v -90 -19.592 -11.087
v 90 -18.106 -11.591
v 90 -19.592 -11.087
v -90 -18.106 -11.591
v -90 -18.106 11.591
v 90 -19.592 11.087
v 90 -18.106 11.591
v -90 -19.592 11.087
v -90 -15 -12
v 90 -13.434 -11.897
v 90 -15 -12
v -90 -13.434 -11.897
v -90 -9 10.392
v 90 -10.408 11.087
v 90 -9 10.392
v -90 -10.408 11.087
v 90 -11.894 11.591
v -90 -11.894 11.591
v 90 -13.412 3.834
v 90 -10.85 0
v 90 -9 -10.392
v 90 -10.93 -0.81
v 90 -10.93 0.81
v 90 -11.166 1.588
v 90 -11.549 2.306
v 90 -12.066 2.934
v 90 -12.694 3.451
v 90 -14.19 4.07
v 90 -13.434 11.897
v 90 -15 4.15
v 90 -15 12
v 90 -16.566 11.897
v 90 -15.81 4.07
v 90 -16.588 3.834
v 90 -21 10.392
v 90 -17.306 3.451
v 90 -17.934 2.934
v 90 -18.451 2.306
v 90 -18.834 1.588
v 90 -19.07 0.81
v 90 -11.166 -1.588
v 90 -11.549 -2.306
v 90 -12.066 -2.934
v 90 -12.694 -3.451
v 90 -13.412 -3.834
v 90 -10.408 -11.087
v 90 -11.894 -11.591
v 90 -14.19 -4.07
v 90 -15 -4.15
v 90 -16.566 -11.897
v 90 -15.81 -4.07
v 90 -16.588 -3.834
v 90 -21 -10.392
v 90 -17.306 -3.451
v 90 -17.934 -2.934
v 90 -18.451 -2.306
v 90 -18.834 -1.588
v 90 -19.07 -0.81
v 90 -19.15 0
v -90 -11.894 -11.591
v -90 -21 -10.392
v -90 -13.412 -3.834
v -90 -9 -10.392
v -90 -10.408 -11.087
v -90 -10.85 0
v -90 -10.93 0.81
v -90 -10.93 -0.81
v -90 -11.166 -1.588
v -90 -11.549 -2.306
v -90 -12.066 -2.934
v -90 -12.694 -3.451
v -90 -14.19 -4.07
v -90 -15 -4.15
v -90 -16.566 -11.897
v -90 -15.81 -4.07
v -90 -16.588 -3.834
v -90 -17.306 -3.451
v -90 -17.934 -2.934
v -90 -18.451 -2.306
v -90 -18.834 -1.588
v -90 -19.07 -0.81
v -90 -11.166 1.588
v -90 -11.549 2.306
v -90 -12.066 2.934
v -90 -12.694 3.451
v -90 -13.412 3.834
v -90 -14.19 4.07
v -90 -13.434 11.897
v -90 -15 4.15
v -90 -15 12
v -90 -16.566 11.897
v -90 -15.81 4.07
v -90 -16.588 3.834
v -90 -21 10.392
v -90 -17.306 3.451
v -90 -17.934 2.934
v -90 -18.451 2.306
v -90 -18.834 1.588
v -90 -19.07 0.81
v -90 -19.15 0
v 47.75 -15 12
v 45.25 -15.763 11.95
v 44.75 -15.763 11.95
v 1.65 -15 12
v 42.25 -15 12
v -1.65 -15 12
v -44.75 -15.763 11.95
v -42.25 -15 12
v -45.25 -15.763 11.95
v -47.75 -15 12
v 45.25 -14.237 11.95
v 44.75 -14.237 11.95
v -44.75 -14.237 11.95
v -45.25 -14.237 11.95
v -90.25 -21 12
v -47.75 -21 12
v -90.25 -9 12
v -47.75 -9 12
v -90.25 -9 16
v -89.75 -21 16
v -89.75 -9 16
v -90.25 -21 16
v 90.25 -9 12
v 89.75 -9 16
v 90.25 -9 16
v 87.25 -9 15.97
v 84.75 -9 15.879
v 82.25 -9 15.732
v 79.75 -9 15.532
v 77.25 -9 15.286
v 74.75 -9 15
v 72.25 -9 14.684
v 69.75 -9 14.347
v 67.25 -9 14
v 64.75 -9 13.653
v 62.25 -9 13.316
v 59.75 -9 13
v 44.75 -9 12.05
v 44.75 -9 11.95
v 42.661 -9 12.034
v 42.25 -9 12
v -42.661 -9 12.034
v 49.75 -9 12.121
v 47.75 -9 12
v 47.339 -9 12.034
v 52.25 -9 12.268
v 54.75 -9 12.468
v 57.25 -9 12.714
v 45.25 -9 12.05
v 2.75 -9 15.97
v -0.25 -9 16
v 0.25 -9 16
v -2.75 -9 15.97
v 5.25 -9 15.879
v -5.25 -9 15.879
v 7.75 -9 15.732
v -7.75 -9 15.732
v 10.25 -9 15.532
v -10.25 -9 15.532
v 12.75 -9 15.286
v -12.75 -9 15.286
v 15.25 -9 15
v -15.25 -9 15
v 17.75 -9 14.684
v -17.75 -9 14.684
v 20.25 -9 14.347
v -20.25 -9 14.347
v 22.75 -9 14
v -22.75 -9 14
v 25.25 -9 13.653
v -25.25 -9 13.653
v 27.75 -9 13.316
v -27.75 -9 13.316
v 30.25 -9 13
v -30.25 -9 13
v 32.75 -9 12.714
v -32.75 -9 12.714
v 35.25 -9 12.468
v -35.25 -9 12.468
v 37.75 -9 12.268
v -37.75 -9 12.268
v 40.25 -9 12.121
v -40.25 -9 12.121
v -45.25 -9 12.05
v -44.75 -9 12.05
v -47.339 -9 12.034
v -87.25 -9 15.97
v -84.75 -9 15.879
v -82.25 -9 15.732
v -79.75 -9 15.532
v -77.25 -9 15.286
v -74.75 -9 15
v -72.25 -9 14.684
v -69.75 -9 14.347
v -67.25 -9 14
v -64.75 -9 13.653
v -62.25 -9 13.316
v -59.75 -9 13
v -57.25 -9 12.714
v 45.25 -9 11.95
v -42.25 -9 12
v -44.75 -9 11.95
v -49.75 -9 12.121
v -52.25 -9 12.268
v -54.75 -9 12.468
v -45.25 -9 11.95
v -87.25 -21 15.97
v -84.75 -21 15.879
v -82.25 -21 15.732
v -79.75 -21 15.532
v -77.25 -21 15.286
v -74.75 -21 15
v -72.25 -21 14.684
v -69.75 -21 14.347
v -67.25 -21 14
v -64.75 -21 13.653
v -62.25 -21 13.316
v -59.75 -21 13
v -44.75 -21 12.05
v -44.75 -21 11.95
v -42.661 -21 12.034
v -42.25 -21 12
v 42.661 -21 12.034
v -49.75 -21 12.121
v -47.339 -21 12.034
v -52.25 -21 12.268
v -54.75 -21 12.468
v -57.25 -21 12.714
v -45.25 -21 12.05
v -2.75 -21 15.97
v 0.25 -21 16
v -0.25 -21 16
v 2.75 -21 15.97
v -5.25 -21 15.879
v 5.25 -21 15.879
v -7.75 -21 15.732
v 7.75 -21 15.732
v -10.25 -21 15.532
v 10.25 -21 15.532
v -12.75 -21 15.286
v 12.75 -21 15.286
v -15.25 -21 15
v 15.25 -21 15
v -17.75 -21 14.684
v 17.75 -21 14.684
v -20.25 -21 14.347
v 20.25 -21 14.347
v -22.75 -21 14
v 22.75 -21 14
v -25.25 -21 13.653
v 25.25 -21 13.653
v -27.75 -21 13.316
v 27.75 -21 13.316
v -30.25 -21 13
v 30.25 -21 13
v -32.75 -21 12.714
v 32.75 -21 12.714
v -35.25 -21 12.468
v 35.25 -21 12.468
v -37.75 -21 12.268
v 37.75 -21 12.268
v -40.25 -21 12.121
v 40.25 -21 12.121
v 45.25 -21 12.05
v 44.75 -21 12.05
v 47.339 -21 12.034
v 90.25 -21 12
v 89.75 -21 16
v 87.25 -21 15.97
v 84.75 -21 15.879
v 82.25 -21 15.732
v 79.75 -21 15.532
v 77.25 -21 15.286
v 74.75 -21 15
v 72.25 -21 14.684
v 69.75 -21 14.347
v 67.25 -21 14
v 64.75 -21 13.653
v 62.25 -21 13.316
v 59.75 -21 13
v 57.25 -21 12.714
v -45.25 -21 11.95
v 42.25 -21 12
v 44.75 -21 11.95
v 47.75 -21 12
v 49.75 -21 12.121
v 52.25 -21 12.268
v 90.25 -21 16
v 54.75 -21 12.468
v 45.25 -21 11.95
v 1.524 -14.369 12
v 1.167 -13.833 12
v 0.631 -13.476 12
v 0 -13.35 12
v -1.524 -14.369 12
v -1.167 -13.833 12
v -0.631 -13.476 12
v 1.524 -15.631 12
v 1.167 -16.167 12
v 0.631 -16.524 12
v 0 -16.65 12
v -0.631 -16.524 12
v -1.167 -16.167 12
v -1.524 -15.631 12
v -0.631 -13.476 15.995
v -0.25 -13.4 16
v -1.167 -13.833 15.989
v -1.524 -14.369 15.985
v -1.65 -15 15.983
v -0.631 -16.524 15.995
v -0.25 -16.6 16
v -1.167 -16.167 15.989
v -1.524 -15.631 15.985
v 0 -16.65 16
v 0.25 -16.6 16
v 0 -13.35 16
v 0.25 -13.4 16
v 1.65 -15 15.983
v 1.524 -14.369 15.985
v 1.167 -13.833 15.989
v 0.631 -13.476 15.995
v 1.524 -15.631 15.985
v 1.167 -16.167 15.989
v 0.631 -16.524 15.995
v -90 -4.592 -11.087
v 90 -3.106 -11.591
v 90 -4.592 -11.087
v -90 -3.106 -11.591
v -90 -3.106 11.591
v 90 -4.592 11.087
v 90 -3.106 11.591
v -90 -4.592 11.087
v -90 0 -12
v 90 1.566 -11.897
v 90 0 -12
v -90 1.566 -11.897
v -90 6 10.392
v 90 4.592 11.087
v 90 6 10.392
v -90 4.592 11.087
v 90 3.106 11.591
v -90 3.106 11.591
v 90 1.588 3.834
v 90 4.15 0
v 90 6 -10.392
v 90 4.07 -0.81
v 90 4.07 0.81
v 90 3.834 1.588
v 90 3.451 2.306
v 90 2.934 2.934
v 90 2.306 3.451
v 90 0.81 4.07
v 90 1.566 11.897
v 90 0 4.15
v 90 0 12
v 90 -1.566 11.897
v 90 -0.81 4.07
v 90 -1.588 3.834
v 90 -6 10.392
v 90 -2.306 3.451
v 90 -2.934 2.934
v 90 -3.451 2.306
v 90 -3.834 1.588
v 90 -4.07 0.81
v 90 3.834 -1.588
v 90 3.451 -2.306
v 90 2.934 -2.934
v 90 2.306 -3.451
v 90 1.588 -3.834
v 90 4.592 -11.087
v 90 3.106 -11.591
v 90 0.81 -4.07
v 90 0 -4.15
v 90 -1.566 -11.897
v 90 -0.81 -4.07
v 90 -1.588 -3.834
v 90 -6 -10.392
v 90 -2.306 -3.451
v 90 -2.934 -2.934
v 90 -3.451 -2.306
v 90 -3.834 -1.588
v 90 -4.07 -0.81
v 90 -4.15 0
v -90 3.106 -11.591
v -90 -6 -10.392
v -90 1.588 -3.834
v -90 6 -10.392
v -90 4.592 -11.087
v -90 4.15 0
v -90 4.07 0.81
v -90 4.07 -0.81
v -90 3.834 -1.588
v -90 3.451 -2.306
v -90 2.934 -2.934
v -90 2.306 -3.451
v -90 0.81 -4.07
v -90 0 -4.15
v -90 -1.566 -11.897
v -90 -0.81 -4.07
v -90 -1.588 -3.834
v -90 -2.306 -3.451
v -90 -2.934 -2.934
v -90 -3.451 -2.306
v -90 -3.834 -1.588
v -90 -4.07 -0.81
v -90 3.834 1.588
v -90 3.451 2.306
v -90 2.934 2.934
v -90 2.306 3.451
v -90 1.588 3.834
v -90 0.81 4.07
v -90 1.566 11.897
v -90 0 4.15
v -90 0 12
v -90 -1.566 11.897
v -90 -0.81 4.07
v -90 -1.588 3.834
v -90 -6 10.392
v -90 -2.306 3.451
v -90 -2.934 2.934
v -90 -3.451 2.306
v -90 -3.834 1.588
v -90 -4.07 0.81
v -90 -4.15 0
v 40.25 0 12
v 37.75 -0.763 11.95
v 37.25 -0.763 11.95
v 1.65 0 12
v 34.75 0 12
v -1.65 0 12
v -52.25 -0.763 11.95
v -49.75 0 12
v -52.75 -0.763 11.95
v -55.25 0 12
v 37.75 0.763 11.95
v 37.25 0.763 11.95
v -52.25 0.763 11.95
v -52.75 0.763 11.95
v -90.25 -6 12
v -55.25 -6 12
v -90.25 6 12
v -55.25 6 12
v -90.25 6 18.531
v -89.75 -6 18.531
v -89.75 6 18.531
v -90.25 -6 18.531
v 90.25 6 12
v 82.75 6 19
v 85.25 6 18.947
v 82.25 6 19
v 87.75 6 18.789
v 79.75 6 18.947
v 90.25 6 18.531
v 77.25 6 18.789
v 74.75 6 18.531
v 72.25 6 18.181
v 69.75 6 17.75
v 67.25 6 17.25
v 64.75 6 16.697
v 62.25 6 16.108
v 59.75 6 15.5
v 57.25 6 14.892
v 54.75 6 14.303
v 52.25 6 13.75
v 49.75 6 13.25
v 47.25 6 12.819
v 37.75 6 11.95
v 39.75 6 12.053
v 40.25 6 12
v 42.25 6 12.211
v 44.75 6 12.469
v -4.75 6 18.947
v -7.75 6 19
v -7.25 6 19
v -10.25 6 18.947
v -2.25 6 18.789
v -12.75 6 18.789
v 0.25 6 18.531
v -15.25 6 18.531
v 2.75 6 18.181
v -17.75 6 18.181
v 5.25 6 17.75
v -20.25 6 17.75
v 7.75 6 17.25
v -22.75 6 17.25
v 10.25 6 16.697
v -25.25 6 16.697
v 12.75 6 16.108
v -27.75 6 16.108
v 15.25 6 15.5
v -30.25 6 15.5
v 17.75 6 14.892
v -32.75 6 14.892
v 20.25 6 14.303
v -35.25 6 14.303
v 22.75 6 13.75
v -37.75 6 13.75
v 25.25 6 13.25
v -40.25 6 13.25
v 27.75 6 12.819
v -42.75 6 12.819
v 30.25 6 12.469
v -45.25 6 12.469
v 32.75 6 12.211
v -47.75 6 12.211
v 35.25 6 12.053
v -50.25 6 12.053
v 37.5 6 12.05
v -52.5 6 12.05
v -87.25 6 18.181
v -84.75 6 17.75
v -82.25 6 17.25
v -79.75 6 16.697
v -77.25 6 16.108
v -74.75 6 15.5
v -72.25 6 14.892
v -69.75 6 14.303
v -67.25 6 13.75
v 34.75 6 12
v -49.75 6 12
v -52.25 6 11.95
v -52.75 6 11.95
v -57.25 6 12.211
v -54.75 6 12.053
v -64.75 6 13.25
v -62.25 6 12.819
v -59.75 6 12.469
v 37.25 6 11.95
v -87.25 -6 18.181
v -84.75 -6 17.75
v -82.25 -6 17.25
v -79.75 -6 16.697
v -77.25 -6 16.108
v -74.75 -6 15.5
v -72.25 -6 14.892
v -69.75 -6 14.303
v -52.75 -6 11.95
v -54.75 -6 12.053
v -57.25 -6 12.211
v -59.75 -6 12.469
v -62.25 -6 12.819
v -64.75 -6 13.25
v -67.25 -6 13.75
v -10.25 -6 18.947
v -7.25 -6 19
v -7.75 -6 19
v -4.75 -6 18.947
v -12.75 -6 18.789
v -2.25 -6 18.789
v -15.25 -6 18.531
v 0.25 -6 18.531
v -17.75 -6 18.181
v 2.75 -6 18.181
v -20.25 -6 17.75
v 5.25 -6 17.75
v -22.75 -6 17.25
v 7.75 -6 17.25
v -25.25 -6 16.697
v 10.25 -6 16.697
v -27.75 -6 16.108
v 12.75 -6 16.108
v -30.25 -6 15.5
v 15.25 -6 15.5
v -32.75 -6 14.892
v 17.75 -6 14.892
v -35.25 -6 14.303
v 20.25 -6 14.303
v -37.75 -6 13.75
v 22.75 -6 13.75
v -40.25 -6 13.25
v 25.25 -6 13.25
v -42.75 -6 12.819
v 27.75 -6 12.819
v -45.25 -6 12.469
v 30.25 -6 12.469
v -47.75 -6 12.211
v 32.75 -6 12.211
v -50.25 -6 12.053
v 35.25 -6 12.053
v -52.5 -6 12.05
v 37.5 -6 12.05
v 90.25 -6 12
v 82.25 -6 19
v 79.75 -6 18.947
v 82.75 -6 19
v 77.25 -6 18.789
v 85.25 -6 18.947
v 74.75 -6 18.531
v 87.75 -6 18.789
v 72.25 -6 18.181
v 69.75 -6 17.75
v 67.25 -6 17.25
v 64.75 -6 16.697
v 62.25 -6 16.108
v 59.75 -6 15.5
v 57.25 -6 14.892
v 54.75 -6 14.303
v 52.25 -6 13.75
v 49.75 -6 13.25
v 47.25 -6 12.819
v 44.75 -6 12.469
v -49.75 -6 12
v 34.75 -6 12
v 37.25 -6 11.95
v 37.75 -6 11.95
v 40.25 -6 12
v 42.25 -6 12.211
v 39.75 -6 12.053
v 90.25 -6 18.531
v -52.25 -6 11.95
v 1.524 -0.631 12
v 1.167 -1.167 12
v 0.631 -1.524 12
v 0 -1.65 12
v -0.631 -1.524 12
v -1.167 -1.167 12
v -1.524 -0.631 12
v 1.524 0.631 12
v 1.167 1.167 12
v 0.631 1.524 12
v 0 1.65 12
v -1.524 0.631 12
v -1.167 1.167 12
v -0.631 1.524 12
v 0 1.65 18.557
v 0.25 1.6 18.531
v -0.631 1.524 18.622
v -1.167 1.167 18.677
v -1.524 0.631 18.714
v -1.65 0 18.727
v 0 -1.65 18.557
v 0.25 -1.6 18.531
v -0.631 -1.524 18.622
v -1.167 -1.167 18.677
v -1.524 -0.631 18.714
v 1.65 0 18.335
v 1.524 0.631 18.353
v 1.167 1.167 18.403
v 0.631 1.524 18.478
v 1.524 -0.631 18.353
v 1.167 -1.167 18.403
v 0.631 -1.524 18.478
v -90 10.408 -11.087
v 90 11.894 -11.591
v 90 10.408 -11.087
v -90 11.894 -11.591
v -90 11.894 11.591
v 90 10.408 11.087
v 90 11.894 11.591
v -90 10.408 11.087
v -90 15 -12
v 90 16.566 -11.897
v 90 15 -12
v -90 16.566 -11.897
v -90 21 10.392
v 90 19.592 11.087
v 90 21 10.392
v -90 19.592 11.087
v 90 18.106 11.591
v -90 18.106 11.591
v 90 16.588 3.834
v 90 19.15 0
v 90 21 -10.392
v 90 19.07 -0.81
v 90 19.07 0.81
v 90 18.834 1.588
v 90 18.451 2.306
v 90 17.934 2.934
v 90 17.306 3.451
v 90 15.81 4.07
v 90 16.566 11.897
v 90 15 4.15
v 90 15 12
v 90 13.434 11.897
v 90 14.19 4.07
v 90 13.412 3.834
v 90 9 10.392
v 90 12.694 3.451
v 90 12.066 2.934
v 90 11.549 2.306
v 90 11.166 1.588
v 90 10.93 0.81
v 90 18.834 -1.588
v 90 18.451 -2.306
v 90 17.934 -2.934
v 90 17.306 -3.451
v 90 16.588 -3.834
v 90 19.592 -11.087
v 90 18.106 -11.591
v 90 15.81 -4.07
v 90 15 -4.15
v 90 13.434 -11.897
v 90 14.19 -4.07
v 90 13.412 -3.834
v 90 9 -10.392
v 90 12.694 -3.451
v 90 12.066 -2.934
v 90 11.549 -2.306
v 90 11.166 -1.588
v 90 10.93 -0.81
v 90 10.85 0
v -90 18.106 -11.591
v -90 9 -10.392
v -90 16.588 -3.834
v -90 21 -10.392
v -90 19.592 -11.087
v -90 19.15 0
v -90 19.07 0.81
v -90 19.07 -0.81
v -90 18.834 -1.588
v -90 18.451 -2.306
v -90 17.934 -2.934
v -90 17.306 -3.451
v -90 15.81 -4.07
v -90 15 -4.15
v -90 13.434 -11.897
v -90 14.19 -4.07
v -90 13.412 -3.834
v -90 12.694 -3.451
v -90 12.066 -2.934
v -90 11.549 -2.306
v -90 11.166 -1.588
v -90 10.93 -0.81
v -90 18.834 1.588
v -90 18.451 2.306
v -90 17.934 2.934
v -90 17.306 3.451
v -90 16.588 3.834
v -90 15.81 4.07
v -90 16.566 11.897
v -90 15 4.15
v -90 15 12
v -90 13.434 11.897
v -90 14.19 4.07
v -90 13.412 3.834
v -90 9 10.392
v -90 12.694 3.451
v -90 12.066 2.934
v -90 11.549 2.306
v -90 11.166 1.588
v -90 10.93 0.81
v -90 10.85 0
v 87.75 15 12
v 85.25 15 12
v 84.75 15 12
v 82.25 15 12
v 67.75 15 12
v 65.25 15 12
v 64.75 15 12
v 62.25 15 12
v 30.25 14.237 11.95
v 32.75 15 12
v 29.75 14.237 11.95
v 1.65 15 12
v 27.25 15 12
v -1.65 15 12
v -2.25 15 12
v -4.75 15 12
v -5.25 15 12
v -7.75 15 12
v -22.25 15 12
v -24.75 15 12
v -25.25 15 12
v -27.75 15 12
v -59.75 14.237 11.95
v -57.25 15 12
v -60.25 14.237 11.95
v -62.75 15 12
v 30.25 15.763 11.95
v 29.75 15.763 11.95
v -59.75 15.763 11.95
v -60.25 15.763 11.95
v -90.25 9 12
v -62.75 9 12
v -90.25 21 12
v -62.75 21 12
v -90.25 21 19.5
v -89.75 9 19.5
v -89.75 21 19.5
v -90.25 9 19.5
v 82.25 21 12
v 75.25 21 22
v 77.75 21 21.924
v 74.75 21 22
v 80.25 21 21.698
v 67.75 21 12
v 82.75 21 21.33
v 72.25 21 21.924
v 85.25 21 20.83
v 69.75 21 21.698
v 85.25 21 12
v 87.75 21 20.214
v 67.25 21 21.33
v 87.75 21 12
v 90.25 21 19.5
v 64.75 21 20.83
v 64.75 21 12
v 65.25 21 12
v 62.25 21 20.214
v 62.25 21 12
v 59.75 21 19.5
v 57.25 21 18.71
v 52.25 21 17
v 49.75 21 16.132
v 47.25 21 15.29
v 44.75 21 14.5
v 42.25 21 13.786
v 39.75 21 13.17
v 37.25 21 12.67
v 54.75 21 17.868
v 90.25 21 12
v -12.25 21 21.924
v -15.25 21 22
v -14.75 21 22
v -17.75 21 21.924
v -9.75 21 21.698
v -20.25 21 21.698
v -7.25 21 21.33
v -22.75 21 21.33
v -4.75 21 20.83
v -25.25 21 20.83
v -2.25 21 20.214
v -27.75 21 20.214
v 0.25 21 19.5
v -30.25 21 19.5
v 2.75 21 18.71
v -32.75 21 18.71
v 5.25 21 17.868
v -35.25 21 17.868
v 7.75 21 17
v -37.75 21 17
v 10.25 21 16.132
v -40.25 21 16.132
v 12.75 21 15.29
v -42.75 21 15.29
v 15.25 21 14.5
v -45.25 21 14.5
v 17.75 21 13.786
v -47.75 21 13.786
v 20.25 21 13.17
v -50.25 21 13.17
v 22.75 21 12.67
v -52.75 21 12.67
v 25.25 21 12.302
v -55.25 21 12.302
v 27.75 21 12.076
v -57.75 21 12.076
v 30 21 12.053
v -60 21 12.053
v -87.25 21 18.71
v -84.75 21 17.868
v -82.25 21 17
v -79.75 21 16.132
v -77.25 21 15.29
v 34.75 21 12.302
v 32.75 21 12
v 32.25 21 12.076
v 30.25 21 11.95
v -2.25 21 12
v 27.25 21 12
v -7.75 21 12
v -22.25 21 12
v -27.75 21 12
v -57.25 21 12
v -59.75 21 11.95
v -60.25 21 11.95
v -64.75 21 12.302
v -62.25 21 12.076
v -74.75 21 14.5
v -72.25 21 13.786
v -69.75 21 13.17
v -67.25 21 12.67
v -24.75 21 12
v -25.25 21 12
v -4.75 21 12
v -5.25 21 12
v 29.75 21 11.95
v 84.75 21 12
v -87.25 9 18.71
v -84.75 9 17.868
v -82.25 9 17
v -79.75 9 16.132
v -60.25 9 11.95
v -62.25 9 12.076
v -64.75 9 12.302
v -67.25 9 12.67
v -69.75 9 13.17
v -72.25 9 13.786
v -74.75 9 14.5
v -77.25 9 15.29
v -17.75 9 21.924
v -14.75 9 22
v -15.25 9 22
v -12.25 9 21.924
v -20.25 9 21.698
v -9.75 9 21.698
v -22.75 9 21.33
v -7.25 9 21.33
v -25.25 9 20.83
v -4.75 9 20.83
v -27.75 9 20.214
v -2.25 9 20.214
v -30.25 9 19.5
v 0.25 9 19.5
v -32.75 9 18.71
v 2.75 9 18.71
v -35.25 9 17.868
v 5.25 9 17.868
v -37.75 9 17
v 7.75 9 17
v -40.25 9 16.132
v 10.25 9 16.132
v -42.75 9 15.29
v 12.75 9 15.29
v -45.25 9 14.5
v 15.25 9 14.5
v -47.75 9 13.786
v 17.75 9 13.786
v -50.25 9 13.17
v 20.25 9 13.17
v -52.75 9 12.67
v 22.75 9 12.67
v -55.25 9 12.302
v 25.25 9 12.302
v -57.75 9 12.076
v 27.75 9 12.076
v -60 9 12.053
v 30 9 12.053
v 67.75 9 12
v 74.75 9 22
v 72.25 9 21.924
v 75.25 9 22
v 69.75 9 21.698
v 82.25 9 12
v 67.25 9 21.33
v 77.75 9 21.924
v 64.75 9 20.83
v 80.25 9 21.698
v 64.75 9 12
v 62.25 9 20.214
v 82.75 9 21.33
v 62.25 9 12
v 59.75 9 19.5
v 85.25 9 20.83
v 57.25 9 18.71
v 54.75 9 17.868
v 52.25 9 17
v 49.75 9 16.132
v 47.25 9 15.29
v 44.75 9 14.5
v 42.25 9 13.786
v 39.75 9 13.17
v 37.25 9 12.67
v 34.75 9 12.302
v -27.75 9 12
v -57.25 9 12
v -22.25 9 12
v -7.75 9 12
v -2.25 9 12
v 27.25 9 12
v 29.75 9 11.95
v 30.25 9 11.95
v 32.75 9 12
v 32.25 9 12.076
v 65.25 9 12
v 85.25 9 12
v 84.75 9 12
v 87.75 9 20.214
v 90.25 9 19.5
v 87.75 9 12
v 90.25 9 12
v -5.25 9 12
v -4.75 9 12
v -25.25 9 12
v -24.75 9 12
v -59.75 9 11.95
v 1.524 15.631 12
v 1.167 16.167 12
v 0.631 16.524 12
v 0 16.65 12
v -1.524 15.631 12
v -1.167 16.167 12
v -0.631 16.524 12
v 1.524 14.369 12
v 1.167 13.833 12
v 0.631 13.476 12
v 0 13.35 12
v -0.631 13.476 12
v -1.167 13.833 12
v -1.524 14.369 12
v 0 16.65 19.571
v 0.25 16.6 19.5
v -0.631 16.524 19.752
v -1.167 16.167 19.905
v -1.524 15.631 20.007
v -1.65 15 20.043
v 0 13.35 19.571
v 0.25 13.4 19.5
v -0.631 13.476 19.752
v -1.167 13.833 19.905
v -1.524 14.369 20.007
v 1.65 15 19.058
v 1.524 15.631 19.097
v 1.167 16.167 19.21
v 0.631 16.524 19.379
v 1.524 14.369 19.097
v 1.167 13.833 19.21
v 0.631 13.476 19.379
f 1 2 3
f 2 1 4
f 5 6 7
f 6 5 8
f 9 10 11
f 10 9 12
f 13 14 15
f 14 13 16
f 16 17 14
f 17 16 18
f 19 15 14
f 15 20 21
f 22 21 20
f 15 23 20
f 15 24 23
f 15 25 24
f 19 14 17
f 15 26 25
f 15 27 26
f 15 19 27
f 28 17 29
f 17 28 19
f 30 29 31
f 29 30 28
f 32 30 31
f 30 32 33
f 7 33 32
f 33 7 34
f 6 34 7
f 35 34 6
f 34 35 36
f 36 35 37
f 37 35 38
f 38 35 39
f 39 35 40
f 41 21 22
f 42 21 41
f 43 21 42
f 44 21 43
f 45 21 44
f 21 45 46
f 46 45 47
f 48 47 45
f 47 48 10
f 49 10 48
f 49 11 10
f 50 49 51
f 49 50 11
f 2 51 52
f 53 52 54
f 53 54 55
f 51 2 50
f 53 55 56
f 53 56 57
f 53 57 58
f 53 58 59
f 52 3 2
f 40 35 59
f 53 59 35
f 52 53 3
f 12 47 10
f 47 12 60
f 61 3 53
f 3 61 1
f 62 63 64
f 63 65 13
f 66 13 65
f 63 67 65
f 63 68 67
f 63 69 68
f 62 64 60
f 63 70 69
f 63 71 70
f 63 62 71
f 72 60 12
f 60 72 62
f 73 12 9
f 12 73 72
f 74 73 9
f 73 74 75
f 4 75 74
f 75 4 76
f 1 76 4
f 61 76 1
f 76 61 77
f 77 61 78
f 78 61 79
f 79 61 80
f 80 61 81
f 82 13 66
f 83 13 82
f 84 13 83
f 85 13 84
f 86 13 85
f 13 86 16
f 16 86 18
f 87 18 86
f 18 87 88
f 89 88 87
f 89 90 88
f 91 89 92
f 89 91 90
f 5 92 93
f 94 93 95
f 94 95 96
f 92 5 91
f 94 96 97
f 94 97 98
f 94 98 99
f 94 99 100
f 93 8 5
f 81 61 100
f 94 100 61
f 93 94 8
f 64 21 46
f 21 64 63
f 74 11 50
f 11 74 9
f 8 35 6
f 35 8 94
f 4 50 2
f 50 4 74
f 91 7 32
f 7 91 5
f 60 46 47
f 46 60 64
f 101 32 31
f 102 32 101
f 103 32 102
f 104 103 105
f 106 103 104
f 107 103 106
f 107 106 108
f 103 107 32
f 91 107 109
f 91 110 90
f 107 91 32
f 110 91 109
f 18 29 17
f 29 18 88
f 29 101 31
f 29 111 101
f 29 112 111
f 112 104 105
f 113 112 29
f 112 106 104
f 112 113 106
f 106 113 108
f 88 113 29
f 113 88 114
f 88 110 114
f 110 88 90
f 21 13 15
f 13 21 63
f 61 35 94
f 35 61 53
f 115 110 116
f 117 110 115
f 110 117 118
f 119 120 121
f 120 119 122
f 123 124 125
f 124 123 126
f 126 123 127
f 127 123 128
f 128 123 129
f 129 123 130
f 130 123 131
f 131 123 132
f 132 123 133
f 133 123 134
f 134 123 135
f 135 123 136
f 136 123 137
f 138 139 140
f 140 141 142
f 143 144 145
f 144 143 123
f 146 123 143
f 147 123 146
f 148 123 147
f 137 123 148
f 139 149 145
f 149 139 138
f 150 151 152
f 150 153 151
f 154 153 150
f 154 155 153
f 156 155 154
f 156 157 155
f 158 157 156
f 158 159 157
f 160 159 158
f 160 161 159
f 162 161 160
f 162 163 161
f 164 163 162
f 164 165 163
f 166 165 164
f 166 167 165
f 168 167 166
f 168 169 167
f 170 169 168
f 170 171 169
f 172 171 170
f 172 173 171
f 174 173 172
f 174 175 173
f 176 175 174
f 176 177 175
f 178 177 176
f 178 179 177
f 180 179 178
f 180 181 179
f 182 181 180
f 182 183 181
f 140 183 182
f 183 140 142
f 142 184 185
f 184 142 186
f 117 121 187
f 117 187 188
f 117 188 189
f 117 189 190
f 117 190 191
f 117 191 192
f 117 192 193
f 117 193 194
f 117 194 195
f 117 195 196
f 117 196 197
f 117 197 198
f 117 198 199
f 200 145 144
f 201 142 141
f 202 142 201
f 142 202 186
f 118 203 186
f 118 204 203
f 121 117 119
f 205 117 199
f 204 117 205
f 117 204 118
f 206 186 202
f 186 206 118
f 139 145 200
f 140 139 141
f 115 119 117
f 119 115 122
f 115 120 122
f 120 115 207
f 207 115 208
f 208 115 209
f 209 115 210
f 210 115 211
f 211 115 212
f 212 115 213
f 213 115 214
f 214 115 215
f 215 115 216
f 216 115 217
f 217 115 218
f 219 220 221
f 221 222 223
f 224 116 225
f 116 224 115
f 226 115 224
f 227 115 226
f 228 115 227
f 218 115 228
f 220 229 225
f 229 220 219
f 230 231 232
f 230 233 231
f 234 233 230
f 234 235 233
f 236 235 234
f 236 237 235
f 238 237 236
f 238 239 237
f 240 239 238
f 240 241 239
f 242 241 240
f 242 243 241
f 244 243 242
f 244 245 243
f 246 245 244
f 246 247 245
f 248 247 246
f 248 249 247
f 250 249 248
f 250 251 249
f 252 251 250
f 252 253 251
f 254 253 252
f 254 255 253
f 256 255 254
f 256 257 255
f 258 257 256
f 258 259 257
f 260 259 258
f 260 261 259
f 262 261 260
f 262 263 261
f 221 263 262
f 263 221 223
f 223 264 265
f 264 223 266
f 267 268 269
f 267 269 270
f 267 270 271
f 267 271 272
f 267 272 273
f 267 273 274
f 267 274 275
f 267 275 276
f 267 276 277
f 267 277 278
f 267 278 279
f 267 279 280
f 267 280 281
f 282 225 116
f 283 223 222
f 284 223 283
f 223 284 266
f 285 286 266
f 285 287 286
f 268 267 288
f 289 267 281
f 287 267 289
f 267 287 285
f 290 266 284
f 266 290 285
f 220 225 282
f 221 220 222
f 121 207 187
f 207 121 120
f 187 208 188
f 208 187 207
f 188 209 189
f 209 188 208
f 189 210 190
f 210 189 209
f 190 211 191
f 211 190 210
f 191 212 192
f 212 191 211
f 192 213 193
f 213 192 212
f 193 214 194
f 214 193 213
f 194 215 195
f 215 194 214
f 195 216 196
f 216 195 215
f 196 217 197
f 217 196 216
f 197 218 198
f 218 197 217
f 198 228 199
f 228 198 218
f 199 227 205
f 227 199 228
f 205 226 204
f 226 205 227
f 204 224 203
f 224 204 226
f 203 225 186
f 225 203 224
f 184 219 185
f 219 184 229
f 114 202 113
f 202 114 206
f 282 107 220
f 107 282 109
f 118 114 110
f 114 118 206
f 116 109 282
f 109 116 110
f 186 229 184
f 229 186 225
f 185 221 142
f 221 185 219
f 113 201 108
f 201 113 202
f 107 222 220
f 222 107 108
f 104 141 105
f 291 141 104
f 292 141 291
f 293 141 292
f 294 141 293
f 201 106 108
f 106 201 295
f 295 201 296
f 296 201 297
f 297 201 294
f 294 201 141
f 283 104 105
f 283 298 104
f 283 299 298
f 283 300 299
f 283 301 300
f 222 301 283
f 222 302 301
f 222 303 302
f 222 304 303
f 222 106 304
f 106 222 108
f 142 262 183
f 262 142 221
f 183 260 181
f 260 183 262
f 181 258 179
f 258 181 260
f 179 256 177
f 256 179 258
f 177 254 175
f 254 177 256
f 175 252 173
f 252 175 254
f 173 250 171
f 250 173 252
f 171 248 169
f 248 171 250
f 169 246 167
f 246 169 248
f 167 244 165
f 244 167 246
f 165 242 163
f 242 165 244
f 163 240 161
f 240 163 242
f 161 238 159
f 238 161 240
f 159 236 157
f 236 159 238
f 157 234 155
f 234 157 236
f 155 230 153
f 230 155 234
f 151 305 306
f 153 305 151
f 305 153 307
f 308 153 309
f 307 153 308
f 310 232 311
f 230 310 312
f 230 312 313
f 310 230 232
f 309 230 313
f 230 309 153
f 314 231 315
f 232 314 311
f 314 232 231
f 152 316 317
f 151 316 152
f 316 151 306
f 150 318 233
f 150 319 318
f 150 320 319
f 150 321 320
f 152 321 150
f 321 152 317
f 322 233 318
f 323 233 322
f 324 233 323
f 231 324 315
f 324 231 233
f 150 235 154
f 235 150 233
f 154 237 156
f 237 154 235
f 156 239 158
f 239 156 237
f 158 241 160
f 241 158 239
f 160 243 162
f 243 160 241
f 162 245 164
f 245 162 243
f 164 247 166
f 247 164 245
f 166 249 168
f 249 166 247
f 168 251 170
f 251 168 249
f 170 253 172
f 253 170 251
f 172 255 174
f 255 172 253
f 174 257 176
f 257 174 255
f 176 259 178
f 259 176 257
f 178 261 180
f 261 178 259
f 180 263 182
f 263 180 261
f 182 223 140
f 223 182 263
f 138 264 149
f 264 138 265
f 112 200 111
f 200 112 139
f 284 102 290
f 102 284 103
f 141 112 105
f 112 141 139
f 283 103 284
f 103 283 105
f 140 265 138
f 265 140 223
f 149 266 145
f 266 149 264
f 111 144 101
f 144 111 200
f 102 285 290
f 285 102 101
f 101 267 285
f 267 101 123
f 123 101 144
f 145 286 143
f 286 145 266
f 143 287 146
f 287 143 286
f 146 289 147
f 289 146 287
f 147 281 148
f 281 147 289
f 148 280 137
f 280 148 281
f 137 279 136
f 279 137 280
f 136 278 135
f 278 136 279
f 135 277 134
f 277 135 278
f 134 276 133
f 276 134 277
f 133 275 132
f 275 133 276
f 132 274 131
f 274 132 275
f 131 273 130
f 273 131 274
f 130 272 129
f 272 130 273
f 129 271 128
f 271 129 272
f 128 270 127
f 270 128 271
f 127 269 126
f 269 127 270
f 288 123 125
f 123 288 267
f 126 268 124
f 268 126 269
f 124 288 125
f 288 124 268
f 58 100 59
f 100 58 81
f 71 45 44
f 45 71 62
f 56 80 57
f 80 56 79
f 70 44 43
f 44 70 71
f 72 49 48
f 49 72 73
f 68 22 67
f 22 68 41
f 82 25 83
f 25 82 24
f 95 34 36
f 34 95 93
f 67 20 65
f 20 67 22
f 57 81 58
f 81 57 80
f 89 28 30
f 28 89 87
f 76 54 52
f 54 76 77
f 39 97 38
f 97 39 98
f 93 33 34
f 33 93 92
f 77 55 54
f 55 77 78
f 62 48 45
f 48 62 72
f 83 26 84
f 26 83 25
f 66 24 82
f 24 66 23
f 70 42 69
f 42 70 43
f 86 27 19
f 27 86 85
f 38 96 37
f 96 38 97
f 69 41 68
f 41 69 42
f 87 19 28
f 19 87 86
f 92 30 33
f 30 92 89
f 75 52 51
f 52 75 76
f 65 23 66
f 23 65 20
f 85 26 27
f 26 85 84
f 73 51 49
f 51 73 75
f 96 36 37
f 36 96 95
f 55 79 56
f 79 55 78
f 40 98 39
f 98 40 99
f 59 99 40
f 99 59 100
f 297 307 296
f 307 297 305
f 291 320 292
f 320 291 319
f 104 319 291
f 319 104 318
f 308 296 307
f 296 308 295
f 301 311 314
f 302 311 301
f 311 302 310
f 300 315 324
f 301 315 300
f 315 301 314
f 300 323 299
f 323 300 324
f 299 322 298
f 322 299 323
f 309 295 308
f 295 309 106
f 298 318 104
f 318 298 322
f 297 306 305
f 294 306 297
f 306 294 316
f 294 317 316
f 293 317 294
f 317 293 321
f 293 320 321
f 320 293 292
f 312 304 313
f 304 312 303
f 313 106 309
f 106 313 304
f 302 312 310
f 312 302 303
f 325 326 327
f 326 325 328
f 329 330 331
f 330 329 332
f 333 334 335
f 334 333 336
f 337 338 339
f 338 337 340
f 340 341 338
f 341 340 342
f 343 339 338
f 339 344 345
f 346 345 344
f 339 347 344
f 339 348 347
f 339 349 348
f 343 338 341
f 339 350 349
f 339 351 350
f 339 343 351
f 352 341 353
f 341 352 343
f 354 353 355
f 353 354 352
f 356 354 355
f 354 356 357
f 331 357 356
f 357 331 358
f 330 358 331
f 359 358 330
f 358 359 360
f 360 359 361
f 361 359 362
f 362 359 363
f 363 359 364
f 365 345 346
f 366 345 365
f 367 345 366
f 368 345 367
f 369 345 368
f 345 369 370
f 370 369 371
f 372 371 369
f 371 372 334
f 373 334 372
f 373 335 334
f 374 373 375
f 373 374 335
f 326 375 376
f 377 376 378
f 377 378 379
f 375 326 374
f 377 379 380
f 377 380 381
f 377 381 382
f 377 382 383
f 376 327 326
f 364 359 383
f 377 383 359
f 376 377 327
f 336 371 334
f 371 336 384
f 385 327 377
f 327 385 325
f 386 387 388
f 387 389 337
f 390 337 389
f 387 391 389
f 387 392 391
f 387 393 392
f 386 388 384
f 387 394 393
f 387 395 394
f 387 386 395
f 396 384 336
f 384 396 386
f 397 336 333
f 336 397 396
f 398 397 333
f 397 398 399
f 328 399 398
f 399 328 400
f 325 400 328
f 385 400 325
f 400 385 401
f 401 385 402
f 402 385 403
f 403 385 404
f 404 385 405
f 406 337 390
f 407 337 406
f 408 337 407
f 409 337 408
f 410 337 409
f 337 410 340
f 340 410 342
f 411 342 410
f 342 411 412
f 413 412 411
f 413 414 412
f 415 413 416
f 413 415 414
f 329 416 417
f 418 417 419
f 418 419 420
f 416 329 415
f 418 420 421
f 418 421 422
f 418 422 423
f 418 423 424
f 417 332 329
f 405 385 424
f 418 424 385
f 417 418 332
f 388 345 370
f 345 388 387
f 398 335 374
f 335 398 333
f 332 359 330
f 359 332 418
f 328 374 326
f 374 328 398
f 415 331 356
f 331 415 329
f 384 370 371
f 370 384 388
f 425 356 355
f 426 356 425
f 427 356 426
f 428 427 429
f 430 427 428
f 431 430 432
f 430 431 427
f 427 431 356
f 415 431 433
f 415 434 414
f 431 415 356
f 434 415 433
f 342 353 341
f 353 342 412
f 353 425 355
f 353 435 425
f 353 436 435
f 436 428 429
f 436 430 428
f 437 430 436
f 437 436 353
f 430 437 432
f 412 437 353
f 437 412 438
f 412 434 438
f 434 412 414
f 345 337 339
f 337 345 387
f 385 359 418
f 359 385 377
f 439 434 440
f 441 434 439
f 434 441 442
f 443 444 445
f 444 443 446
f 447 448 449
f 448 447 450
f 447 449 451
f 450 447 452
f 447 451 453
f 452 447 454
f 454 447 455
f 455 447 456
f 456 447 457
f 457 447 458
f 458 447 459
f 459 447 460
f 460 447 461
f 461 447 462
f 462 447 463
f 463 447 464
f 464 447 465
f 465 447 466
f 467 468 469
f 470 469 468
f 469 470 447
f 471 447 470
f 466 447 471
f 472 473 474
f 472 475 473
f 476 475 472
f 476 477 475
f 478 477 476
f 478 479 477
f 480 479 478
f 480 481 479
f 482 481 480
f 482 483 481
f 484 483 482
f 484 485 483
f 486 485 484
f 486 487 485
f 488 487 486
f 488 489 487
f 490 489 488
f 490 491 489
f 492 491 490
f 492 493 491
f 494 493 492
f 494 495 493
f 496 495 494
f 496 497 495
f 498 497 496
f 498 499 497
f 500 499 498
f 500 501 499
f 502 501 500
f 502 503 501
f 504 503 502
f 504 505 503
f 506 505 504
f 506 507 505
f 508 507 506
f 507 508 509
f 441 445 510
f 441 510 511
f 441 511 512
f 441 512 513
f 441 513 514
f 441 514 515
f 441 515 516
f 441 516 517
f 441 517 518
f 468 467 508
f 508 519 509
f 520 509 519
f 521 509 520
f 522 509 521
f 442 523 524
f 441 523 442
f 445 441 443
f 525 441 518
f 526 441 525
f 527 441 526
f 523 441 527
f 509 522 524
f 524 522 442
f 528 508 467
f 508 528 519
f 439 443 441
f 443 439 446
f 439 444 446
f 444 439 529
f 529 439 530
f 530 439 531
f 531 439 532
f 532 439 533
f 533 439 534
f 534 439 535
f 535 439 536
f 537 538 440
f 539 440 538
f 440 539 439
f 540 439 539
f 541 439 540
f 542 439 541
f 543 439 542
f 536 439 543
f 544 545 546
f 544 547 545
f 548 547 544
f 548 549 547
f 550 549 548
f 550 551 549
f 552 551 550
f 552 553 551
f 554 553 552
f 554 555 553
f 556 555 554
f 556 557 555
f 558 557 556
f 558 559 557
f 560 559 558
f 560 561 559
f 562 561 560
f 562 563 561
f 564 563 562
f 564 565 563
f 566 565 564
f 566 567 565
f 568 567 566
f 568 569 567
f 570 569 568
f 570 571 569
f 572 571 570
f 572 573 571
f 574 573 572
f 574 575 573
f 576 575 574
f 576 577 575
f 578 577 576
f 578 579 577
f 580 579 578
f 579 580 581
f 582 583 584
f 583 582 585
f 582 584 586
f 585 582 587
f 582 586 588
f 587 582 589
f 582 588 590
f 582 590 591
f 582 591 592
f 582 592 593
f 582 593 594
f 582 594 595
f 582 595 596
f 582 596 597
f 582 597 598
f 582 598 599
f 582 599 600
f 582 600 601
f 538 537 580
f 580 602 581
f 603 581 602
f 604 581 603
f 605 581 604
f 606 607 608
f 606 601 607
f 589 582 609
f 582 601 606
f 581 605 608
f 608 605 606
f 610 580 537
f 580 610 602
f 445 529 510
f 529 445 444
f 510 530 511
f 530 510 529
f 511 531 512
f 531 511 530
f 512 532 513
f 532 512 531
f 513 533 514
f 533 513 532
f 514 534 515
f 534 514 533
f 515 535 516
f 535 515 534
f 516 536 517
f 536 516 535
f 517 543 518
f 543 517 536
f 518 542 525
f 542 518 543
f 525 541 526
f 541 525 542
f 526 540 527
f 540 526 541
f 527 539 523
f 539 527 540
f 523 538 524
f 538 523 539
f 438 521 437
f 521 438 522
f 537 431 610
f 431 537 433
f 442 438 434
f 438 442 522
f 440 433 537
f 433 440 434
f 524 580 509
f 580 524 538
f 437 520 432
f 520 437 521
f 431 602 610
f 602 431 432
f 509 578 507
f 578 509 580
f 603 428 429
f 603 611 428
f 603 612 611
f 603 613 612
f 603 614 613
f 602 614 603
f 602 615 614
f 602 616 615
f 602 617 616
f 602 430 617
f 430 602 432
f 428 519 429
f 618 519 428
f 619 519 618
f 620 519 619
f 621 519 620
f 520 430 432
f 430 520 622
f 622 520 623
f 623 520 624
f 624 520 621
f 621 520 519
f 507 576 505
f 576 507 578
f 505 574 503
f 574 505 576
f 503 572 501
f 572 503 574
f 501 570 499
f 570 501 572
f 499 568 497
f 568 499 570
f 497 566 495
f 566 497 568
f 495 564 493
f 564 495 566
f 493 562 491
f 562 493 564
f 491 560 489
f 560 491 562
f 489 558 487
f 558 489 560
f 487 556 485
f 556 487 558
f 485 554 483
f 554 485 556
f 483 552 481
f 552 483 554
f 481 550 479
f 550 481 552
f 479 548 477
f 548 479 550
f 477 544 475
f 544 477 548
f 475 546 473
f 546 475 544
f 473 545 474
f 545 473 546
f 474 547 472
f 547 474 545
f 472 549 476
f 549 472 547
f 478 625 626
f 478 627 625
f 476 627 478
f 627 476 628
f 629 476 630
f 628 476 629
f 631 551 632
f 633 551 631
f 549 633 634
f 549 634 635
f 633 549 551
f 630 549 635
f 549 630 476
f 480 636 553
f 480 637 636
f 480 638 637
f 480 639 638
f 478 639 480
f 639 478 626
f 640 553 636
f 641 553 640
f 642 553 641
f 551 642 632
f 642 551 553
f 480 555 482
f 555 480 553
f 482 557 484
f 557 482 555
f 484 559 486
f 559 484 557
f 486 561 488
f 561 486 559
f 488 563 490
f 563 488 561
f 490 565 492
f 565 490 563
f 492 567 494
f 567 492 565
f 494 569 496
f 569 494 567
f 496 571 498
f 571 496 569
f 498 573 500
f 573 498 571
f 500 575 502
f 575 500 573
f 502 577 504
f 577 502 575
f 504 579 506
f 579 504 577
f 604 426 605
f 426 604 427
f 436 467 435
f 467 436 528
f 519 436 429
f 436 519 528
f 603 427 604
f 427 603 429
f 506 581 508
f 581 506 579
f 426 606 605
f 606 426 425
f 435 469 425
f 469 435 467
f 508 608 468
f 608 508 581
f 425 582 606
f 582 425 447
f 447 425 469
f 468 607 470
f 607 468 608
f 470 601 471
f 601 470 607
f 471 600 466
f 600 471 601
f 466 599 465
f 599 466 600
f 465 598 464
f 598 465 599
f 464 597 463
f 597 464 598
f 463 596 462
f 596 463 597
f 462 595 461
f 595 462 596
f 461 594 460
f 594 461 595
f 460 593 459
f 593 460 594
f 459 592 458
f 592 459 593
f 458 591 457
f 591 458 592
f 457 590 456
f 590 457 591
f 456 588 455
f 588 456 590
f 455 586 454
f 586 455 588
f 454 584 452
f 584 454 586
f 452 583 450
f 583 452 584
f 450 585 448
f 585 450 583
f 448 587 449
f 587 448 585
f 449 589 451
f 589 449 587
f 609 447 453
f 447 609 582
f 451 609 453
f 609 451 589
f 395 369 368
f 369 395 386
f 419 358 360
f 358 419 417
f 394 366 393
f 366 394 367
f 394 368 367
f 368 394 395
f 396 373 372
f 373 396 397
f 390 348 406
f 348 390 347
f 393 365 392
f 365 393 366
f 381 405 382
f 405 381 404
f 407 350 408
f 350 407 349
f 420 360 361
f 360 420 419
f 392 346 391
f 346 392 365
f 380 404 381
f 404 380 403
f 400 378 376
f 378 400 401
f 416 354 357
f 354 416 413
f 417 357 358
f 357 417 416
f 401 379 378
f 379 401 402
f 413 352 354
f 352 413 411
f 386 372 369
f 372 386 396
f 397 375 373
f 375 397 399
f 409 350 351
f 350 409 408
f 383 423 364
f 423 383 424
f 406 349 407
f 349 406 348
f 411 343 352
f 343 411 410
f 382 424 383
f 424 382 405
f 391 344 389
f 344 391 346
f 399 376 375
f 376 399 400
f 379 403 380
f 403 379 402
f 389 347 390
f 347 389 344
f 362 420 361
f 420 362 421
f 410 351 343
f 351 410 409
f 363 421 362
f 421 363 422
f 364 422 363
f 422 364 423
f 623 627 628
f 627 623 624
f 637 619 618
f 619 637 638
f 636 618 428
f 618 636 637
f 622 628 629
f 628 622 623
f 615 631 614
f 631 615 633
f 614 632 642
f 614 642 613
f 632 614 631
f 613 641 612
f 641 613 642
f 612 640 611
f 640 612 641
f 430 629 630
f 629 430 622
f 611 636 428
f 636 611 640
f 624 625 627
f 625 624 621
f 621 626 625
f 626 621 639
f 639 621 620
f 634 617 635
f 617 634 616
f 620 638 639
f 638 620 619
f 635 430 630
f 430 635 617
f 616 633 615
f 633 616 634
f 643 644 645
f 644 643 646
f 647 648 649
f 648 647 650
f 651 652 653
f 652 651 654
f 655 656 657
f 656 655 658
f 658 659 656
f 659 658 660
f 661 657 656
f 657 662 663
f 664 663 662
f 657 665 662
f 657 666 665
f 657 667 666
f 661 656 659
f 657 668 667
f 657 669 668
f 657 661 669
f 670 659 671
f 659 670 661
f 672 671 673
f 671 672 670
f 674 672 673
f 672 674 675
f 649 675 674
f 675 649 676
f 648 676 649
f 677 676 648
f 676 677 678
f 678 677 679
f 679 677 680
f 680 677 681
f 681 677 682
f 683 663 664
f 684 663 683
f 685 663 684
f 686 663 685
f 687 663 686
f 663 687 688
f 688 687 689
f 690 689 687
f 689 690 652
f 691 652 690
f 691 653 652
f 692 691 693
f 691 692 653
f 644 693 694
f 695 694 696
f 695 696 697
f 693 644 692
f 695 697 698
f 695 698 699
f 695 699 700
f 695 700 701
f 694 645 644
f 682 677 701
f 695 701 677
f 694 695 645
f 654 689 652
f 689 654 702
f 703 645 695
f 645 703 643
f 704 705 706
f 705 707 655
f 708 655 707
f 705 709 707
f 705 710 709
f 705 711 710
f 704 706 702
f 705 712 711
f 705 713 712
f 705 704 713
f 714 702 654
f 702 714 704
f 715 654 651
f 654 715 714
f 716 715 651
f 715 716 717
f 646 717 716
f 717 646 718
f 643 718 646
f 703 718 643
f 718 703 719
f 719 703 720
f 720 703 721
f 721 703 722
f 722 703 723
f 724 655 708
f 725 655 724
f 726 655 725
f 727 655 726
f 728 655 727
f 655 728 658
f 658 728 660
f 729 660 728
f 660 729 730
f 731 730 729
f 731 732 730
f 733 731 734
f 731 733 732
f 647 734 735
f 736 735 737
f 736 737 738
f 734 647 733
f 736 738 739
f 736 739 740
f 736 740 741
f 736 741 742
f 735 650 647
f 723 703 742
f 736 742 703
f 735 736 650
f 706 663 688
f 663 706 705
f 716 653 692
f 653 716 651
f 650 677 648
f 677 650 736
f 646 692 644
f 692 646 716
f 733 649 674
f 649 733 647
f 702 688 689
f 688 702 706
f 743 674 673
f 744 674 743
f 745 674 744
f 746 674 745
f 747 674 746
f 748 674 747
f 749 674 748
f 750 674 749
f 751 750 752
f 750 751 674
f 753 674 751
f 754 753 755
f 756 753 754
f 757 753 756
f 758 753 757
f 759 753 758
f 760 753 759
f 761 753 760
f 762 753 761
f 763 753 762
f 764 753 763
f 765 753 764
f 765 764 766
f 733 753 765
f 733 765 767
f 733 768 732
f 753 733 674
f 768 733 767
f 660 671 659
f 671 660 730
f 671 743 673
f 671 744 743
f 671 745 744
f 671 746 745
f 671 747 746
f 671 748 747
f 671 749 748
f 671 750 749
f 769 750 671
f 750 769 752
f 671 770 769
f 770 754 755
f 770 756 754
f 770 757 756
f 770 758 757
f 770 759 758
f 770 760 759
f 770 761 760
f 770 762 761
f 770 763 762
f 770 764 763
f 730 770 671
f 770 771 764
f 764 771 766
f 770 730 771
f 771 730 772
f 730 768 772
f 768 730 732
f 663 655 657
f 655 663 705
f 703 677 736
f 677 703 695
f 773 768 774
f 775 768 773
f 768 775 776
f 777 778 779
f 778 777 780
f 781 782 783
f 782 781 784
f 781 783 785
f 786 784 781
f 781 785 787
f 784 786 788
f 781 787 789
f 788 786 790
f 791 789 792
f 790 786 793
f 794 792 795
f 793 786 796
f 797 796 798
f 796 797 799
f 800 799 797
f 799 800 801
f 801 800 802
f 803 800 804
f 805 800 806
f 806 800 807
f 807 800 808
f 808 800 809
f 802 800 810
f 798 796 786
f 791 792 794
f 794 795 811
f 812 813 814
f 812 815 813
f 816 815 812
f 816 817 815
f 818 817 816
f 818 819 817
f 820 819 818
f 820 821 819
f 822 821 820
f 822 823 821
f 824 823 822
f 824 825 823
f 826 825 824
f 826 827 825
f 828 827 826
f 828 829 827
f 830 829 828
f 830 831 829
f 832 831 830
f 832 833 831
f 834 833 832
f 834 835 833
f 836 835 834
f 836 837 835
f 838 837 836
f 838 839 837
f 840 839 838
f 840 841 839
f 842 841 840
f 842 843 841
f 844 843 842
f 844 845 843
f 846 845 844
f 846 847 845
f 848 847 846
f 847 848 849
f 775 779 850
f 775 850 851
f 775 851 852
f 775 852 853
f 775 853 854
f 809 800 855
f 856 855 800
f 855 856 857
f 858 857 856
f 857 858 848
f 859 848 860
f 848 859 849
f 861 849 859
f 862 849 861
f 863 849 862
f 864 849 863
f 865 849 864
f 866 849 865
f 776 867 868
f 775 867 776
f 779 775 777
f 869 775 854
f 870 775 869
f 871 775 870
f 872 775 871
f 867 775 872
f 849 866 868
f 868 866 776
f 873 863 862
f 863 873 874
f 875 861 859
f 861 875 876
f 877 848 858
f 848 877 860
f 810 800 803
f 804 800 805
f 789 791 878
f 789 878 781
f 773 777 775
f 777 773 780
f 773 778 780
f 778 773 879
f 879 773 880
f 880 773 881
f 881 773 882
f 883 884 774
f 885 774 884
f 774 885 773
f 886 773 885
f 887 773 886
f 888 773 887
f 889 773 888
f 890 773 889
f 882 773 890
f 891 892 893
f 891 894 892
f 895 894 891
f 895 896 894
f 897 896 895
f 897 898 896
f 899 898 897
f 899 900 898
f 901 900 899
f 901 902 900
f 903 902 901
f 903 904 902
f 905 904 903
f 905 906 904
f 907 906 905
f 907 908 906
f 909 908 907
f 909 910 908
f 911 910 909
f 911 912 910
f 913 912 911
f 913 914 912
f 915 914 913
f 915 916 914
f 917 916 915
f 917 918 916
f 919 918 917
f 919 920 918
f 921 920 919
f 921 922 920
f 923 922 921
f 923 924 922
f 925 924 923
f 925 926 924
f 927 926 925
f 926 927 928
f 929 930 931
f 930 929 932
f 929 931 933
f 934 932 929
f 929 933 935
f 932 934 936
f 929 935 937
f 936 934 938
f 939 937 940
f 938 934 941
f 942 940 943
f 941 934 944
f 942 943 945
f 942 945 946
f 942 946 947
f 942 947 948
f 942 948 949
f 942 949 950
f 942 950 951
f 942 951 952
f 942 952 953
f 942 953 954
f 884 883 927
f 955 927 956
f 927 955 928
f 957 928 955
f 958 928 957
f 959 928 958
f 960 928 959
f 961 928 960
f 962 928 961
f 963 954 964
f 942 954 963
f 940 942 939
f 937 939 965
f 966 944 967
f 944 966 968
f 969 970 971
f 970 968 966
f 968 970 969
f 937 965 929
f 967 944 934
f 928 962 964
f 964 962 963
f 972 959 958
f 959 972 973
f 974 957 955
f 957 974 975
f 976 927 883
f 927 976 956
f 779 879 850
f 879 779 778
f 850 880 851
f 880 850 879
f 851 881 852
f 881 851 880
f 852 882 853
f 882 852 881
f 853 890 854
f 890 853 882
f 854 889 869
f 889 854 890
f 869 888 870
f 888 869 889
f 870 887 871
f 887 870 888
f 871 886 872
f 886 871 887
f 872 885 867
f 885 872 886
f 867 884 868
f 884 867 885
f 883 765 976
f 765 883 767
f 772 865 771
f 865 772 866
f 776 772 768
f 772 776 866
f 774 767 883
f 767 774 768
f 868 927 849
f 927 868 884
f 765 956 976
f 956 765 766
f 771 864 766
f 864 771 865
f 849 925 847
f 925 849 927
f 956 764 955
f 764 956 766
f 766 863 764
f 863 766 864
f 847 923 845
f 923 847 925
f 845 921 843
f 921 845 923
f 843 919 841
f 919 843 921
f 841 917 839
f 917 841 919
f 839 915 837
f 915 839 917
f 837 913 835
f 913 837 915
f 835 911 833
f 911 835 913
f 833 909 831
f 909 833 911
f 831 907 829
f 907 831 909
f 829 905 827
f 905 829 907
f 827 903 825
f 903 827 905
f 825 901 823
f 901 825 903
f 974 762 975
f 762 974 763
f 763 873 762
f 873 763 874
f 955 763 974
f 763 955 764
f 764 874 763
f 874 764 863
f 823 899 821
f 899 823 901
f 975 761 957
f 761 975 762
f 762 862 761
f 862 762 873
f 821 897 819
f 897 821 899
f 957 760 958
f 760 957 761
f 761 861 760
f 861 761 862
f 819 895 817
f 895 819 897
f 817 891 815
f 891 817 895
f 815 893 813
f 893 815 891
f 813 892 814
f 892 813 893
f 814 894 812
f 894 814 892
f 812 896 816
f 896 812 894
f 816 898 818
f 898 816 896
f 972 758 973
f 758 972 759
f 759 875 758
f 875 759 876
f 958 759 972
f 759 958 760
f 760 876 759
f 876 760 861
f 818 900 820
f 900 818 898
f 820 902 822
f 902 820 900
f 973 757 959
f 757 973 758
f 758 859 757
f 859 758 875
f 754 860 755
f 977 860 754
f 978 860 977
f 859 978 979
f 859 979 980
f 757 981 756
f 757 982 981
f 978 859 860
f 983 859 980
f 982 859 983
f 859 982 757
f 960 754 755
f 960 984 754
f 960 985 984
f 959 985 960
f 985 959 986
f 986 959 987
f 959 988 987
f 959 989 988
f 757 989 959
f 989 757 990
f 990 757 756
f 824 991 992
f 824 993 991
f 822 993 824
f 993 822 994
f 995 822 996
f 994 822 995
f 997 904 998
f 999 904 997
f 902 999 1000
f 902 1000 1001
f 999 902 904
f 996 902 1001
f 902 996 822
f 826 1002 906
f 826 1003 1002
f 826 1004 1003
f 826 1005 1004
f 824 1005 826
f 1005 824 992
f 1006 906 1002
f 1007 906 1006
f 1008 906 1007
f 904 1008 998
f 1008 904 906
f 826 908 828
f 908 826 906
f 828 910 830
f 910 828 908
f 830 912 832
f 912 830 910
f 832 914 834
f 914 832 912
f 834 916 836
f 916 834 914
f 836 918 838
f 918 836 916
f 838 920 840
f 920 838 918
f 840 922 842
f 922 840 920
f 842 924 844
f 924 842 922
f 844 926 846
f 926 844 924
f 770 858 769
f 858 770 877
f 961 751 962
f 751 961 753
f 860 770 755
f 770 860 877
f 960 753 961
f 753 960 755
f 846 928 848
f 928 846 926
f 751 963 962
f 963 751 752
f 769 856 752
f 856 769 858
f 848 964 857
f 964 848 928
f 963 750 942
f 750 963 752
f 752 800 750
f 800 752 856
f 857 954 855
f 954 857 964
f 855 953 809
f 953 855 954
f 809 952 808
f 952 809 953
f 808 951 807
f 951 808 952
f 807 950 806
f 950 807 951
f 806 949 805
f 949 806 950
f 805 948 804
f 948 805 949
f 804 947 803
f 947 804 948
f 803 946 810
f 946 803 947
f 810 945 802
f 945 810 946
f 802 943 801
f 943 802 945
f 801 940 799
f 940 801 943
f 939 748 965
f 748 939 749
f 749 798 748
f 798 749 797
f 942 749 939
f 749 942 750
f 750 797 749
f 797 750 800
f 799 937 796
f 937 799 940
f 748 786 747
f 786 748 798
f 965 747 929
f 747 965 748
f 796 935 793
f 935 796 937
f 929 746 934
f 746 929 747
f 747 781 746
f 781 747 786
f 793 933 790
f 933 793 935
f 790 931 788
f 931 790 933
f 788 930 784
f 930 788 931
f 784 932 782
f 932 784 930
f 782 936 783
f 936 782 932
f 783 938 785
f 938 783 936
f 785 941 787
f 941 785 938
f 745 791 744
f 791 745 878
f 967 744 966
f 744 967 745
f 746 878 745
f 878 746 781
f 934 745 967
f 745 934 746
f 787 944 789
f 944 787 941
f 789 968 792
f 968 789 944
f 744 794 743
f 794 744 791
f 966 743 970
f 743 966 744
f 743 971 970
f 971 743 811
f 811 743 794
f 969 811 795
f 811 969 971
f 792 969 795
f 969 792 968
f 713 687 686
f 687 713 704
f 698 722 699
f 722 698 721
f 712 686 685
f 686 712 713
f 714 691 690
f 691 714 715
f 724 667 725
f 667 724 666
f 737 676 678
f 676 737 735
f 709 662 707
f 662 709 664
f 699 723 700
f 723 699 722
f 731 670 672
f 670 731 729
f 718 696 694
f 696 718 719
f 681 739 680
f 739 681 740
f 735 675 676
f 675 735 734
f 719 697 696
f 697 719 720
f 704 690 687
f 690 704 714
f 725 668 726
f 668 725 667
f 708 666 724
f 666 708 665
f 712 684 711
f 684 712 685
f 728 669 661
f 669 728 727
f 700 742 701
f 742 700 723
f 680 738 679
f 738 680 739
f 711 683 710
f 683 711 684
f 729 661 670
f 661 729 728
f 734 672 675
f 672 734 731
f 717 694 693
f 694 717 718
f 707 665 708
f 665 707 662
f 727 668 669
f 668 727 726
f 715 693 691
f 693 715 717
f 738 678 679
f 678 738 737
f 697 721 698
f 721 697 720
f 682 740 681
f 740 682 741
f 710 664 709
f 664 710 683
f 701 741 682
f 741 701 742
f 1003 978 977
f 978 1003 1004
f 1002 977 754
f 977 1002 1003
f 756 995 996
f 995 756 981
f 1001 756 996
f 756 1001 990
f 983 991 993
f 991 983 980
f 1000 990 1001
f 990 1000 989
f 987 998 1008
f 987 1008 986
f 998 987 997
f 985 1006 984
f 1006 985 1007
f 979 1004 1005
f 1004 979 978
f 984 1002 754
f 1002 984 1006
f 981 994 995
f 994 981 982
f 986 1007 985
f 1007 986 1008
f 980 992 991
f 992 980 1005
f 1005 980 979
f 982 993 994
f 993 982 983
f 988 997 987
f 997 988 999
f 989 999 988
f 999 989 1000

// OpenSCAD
/*
 * CAM_SEPARATE - Single Barrel Cam (12mm Y-width)
 *
 * Each cam is:
 * - 180mm long along X (shaft axis)
 * - 12mm wide in Y (CAM_WIDTH) - thin enough to not collide with neighbors
 * - Has a top surface that varies in Z (cam profile)
 * - Shaft hole through center
 *
 * The cam is essentially a rectangular bar with a curved top surface
 * that creates the wave motion.
 *
 * COORDINATE SYSTEM:
 * - X: shaft axis, cam length = 180mm
 * - Y: cam width = 12mm, centered at Y=0
 * - Z: cam height varies with helical profile
 */

include <../common.scad>

$fn = 48;

// ============================================
// MAIN MODULE
// ============================================

module separate_cam(ridge_height, phase_offset = 0) {
    /*
     * A barrel cam that is:
     * - 180mm long (X)
     * - 12mm wide (Y)
     * - ~22-32mm tall (Z) depending on ridge height
     */
    difference() {
        union() {
            // Core cylinder for shaft mounting
            cam_core();

            // Top surface with helical profile
            cam_surface(ridge_height, phase_offset);
        }

        // Shaft hole along X
        rotate([0, 90, 0])
            cylinder(d = SHAFT_HOLE, h = CAM_LENGTH + 20, center = true, $fn = 32);

        // Set screw from top
        translate([0, 0, CAM_CORE_RADIUS])
            cylinder(d = M3_HOLE, h = ridge_height + 10, $fn = 16);
    }
}

// ============================================
// CAM CORE - Cylinder for shaft mount
// ============================================

module cam_core() {
    /*
     * A cylinder of radius CAM_CORE_RADIUS, spanning full cam length.
     * BUT: we need to limit it to CAM_WIDTH in Y!
     *
     * Solution: intersect cylinder with a bounding box
     */
    intersection() {
        // Full cylinder
        rotate([0, 90, 0])
            cylinder(r = CAM_CORE_RADIUS, h = CAM_LENGTH, center = true, $fn = 48);

        // Bounding box limits Y to CAM_WIDTH
        cube([CAM_LENGTH + 1, CAM_WIDTH, CAM_CORE_RADIUS * 3], center = true);
    }
}

// ============================================
// CAM SURFACE - Top surface with helical profile
// ============================================

module cam_surface(ridge_height, phase_offset) {
    /*
     * The active cam surface that followers ride on.
     * Creates a ridge that spirals along X.
     *
     * Built from slices along X, each slice is a curved top.
     */

    num_slices = 72;
    dx = CAM_LENGTH / num_slices;

    for (i = [0 : num_slices - 1]) {
        x1 = -CAM_LENGTH/2 + i * dx;
        x2 = x1 + dx;

        // Helix phase
        phase1 = (i / num_slices) * 360 * HELIX_TURNS + phase_offset;
        phase2 = ((i + 1) / num_slices) * 360 * HELIX_TURNS + phase_offset;

        // Hull adjacent ridge slices
        hull() {
            translate([x1, 0, 0])
                ridge_slice(phase1, ridge_height);
            translate([x2, 0, 0])
                ridge_slice(phase2, ridge_height);
        }
    }
}

// ============================================
// RIDGE SLICE - Single thin slice of the ridge
// ============================================

module ridge_slice(phase, ridge_height) {
    /*
     * A thin slice showing the ridge height at one X position.
     *
     * The ridge height varies with phase:
     * - At phase = 0°: max height (ridge_height above core)
     * - At phase = 180°: min height (0 above core)
     *
     * We build the ridge as a box on top of the core cylinder.
     */

    // Ridge height at this phase (0 to ridge_height)
    extra_h = ridge_height * (0.5 + 0.5 * cos(phase));

    // Only draw if there's any ridge height
    if (extra_h > 0.01) {
        // Box sits on top of core (which has radius CAM_CORE_RADIUS)
        // Bottom at Z = CAM_CORE_RADIUS, top at Z = CAM_CORE_RADIUS + extra_h
        translate([0, 0, CAM_CORE_RADIUS + extra_h/2])
            cube([0.5, CAM_WIDTH, extra_h], center = true);
    } else {
        // Minimal marker for hulling
        translate([0, 0, CAM_CORE_RADIUS])
            cube([0.5, CAM_WIDTH, 0.1], center = true);
    }
}

// ============================================
// RENDER - Three separate cams
// ============================================

// Cam 0: front (Y = -15), small ridge
color([0.9, 0.5, 0.3])
translate([0, LAYER_Y_OFFSET[0], 0])
    separate_cam(LAYER_RIDGE_HEIGHT[0], LAYER_PHASE_OFFSET[0]);

// Cam 1: middle (Y = 0), medium ridge
color([0.8, 0.5, 0.4])
translate([0, LAYER_Y_OFFSET[1], 0])
    separate_cam(LAYER_RIDGE_HEIGHT[1], LAYER_PHASE_OFFSET[1]);

// Cam 2: back (Y = +15), large ridge
color([0.7, 0.5, 0.5])
translate([0, LAYER_Y_OFFSET[2], 0])
    separate_cam(LAYER_RIDGE_HEIGHT[2], LAYER_PHASE_OFFSET[2]);

// Ghost shaft
%rotate([0, 90, 0])
    cylinder(d = SHAFT_DIA, h = SHAFT_LENGTH, center = true, $fn = 24);

// ============================================
// VERIFICATION
// ============================================

echo("=== 3 SEPARATE CAMS (12mm Y-width each) ===");
echo("");
echo(str("Shaft axis: X"));
echo(str("Cam length (X): ", CAM_LENGTH, "mm"));
echo(str("Cam width (Y): ", CAM_WIDTH, "mm"));
echo(str("Core radius: ", CAM_CORE_RADIUS, "mm"));
echo("");

echo("CAM POSITIONS:");
for (L = [0 : NUM_LAYERS - 1]) {
    y = LAYER_Y_OFFSET[L];
    y_min = y - CAM_WIDTH/2;
    y_max = y + CAM_WIDTH/2;
    ridge = LAYER_RIDGE_HEIGHT[L];
    echo(str("  Cam ", L, ": Y=[", y_min, " to ", y_max, "], ridge=", ridge, "mm"));
}

echo("");
echo("COLLISION CHECK:");
gap_01 = (LAYER_Y_OFFSET[1] - CAM_WIDTH/2) - (LAYER_Y_OFFSET[0] + CAM_WIDTH/2);
gap_12 = (LAYER_Y_OFFSET[2] - CAM_WIDTH/2) - (LAYER_Y_OFFSET[1] + CAM_WIDTH/2);
echo(str("  Gap Cam0-Cam1: ", gap_01, "mm ", (gap_01 > 0 ? "OK" : "COLLISION!")));
echo(str("  Gap Cam1-Cam2: ", gap_12, "mm ", (gap_12 > 0 ? "OK" : "COLLISION!")));
